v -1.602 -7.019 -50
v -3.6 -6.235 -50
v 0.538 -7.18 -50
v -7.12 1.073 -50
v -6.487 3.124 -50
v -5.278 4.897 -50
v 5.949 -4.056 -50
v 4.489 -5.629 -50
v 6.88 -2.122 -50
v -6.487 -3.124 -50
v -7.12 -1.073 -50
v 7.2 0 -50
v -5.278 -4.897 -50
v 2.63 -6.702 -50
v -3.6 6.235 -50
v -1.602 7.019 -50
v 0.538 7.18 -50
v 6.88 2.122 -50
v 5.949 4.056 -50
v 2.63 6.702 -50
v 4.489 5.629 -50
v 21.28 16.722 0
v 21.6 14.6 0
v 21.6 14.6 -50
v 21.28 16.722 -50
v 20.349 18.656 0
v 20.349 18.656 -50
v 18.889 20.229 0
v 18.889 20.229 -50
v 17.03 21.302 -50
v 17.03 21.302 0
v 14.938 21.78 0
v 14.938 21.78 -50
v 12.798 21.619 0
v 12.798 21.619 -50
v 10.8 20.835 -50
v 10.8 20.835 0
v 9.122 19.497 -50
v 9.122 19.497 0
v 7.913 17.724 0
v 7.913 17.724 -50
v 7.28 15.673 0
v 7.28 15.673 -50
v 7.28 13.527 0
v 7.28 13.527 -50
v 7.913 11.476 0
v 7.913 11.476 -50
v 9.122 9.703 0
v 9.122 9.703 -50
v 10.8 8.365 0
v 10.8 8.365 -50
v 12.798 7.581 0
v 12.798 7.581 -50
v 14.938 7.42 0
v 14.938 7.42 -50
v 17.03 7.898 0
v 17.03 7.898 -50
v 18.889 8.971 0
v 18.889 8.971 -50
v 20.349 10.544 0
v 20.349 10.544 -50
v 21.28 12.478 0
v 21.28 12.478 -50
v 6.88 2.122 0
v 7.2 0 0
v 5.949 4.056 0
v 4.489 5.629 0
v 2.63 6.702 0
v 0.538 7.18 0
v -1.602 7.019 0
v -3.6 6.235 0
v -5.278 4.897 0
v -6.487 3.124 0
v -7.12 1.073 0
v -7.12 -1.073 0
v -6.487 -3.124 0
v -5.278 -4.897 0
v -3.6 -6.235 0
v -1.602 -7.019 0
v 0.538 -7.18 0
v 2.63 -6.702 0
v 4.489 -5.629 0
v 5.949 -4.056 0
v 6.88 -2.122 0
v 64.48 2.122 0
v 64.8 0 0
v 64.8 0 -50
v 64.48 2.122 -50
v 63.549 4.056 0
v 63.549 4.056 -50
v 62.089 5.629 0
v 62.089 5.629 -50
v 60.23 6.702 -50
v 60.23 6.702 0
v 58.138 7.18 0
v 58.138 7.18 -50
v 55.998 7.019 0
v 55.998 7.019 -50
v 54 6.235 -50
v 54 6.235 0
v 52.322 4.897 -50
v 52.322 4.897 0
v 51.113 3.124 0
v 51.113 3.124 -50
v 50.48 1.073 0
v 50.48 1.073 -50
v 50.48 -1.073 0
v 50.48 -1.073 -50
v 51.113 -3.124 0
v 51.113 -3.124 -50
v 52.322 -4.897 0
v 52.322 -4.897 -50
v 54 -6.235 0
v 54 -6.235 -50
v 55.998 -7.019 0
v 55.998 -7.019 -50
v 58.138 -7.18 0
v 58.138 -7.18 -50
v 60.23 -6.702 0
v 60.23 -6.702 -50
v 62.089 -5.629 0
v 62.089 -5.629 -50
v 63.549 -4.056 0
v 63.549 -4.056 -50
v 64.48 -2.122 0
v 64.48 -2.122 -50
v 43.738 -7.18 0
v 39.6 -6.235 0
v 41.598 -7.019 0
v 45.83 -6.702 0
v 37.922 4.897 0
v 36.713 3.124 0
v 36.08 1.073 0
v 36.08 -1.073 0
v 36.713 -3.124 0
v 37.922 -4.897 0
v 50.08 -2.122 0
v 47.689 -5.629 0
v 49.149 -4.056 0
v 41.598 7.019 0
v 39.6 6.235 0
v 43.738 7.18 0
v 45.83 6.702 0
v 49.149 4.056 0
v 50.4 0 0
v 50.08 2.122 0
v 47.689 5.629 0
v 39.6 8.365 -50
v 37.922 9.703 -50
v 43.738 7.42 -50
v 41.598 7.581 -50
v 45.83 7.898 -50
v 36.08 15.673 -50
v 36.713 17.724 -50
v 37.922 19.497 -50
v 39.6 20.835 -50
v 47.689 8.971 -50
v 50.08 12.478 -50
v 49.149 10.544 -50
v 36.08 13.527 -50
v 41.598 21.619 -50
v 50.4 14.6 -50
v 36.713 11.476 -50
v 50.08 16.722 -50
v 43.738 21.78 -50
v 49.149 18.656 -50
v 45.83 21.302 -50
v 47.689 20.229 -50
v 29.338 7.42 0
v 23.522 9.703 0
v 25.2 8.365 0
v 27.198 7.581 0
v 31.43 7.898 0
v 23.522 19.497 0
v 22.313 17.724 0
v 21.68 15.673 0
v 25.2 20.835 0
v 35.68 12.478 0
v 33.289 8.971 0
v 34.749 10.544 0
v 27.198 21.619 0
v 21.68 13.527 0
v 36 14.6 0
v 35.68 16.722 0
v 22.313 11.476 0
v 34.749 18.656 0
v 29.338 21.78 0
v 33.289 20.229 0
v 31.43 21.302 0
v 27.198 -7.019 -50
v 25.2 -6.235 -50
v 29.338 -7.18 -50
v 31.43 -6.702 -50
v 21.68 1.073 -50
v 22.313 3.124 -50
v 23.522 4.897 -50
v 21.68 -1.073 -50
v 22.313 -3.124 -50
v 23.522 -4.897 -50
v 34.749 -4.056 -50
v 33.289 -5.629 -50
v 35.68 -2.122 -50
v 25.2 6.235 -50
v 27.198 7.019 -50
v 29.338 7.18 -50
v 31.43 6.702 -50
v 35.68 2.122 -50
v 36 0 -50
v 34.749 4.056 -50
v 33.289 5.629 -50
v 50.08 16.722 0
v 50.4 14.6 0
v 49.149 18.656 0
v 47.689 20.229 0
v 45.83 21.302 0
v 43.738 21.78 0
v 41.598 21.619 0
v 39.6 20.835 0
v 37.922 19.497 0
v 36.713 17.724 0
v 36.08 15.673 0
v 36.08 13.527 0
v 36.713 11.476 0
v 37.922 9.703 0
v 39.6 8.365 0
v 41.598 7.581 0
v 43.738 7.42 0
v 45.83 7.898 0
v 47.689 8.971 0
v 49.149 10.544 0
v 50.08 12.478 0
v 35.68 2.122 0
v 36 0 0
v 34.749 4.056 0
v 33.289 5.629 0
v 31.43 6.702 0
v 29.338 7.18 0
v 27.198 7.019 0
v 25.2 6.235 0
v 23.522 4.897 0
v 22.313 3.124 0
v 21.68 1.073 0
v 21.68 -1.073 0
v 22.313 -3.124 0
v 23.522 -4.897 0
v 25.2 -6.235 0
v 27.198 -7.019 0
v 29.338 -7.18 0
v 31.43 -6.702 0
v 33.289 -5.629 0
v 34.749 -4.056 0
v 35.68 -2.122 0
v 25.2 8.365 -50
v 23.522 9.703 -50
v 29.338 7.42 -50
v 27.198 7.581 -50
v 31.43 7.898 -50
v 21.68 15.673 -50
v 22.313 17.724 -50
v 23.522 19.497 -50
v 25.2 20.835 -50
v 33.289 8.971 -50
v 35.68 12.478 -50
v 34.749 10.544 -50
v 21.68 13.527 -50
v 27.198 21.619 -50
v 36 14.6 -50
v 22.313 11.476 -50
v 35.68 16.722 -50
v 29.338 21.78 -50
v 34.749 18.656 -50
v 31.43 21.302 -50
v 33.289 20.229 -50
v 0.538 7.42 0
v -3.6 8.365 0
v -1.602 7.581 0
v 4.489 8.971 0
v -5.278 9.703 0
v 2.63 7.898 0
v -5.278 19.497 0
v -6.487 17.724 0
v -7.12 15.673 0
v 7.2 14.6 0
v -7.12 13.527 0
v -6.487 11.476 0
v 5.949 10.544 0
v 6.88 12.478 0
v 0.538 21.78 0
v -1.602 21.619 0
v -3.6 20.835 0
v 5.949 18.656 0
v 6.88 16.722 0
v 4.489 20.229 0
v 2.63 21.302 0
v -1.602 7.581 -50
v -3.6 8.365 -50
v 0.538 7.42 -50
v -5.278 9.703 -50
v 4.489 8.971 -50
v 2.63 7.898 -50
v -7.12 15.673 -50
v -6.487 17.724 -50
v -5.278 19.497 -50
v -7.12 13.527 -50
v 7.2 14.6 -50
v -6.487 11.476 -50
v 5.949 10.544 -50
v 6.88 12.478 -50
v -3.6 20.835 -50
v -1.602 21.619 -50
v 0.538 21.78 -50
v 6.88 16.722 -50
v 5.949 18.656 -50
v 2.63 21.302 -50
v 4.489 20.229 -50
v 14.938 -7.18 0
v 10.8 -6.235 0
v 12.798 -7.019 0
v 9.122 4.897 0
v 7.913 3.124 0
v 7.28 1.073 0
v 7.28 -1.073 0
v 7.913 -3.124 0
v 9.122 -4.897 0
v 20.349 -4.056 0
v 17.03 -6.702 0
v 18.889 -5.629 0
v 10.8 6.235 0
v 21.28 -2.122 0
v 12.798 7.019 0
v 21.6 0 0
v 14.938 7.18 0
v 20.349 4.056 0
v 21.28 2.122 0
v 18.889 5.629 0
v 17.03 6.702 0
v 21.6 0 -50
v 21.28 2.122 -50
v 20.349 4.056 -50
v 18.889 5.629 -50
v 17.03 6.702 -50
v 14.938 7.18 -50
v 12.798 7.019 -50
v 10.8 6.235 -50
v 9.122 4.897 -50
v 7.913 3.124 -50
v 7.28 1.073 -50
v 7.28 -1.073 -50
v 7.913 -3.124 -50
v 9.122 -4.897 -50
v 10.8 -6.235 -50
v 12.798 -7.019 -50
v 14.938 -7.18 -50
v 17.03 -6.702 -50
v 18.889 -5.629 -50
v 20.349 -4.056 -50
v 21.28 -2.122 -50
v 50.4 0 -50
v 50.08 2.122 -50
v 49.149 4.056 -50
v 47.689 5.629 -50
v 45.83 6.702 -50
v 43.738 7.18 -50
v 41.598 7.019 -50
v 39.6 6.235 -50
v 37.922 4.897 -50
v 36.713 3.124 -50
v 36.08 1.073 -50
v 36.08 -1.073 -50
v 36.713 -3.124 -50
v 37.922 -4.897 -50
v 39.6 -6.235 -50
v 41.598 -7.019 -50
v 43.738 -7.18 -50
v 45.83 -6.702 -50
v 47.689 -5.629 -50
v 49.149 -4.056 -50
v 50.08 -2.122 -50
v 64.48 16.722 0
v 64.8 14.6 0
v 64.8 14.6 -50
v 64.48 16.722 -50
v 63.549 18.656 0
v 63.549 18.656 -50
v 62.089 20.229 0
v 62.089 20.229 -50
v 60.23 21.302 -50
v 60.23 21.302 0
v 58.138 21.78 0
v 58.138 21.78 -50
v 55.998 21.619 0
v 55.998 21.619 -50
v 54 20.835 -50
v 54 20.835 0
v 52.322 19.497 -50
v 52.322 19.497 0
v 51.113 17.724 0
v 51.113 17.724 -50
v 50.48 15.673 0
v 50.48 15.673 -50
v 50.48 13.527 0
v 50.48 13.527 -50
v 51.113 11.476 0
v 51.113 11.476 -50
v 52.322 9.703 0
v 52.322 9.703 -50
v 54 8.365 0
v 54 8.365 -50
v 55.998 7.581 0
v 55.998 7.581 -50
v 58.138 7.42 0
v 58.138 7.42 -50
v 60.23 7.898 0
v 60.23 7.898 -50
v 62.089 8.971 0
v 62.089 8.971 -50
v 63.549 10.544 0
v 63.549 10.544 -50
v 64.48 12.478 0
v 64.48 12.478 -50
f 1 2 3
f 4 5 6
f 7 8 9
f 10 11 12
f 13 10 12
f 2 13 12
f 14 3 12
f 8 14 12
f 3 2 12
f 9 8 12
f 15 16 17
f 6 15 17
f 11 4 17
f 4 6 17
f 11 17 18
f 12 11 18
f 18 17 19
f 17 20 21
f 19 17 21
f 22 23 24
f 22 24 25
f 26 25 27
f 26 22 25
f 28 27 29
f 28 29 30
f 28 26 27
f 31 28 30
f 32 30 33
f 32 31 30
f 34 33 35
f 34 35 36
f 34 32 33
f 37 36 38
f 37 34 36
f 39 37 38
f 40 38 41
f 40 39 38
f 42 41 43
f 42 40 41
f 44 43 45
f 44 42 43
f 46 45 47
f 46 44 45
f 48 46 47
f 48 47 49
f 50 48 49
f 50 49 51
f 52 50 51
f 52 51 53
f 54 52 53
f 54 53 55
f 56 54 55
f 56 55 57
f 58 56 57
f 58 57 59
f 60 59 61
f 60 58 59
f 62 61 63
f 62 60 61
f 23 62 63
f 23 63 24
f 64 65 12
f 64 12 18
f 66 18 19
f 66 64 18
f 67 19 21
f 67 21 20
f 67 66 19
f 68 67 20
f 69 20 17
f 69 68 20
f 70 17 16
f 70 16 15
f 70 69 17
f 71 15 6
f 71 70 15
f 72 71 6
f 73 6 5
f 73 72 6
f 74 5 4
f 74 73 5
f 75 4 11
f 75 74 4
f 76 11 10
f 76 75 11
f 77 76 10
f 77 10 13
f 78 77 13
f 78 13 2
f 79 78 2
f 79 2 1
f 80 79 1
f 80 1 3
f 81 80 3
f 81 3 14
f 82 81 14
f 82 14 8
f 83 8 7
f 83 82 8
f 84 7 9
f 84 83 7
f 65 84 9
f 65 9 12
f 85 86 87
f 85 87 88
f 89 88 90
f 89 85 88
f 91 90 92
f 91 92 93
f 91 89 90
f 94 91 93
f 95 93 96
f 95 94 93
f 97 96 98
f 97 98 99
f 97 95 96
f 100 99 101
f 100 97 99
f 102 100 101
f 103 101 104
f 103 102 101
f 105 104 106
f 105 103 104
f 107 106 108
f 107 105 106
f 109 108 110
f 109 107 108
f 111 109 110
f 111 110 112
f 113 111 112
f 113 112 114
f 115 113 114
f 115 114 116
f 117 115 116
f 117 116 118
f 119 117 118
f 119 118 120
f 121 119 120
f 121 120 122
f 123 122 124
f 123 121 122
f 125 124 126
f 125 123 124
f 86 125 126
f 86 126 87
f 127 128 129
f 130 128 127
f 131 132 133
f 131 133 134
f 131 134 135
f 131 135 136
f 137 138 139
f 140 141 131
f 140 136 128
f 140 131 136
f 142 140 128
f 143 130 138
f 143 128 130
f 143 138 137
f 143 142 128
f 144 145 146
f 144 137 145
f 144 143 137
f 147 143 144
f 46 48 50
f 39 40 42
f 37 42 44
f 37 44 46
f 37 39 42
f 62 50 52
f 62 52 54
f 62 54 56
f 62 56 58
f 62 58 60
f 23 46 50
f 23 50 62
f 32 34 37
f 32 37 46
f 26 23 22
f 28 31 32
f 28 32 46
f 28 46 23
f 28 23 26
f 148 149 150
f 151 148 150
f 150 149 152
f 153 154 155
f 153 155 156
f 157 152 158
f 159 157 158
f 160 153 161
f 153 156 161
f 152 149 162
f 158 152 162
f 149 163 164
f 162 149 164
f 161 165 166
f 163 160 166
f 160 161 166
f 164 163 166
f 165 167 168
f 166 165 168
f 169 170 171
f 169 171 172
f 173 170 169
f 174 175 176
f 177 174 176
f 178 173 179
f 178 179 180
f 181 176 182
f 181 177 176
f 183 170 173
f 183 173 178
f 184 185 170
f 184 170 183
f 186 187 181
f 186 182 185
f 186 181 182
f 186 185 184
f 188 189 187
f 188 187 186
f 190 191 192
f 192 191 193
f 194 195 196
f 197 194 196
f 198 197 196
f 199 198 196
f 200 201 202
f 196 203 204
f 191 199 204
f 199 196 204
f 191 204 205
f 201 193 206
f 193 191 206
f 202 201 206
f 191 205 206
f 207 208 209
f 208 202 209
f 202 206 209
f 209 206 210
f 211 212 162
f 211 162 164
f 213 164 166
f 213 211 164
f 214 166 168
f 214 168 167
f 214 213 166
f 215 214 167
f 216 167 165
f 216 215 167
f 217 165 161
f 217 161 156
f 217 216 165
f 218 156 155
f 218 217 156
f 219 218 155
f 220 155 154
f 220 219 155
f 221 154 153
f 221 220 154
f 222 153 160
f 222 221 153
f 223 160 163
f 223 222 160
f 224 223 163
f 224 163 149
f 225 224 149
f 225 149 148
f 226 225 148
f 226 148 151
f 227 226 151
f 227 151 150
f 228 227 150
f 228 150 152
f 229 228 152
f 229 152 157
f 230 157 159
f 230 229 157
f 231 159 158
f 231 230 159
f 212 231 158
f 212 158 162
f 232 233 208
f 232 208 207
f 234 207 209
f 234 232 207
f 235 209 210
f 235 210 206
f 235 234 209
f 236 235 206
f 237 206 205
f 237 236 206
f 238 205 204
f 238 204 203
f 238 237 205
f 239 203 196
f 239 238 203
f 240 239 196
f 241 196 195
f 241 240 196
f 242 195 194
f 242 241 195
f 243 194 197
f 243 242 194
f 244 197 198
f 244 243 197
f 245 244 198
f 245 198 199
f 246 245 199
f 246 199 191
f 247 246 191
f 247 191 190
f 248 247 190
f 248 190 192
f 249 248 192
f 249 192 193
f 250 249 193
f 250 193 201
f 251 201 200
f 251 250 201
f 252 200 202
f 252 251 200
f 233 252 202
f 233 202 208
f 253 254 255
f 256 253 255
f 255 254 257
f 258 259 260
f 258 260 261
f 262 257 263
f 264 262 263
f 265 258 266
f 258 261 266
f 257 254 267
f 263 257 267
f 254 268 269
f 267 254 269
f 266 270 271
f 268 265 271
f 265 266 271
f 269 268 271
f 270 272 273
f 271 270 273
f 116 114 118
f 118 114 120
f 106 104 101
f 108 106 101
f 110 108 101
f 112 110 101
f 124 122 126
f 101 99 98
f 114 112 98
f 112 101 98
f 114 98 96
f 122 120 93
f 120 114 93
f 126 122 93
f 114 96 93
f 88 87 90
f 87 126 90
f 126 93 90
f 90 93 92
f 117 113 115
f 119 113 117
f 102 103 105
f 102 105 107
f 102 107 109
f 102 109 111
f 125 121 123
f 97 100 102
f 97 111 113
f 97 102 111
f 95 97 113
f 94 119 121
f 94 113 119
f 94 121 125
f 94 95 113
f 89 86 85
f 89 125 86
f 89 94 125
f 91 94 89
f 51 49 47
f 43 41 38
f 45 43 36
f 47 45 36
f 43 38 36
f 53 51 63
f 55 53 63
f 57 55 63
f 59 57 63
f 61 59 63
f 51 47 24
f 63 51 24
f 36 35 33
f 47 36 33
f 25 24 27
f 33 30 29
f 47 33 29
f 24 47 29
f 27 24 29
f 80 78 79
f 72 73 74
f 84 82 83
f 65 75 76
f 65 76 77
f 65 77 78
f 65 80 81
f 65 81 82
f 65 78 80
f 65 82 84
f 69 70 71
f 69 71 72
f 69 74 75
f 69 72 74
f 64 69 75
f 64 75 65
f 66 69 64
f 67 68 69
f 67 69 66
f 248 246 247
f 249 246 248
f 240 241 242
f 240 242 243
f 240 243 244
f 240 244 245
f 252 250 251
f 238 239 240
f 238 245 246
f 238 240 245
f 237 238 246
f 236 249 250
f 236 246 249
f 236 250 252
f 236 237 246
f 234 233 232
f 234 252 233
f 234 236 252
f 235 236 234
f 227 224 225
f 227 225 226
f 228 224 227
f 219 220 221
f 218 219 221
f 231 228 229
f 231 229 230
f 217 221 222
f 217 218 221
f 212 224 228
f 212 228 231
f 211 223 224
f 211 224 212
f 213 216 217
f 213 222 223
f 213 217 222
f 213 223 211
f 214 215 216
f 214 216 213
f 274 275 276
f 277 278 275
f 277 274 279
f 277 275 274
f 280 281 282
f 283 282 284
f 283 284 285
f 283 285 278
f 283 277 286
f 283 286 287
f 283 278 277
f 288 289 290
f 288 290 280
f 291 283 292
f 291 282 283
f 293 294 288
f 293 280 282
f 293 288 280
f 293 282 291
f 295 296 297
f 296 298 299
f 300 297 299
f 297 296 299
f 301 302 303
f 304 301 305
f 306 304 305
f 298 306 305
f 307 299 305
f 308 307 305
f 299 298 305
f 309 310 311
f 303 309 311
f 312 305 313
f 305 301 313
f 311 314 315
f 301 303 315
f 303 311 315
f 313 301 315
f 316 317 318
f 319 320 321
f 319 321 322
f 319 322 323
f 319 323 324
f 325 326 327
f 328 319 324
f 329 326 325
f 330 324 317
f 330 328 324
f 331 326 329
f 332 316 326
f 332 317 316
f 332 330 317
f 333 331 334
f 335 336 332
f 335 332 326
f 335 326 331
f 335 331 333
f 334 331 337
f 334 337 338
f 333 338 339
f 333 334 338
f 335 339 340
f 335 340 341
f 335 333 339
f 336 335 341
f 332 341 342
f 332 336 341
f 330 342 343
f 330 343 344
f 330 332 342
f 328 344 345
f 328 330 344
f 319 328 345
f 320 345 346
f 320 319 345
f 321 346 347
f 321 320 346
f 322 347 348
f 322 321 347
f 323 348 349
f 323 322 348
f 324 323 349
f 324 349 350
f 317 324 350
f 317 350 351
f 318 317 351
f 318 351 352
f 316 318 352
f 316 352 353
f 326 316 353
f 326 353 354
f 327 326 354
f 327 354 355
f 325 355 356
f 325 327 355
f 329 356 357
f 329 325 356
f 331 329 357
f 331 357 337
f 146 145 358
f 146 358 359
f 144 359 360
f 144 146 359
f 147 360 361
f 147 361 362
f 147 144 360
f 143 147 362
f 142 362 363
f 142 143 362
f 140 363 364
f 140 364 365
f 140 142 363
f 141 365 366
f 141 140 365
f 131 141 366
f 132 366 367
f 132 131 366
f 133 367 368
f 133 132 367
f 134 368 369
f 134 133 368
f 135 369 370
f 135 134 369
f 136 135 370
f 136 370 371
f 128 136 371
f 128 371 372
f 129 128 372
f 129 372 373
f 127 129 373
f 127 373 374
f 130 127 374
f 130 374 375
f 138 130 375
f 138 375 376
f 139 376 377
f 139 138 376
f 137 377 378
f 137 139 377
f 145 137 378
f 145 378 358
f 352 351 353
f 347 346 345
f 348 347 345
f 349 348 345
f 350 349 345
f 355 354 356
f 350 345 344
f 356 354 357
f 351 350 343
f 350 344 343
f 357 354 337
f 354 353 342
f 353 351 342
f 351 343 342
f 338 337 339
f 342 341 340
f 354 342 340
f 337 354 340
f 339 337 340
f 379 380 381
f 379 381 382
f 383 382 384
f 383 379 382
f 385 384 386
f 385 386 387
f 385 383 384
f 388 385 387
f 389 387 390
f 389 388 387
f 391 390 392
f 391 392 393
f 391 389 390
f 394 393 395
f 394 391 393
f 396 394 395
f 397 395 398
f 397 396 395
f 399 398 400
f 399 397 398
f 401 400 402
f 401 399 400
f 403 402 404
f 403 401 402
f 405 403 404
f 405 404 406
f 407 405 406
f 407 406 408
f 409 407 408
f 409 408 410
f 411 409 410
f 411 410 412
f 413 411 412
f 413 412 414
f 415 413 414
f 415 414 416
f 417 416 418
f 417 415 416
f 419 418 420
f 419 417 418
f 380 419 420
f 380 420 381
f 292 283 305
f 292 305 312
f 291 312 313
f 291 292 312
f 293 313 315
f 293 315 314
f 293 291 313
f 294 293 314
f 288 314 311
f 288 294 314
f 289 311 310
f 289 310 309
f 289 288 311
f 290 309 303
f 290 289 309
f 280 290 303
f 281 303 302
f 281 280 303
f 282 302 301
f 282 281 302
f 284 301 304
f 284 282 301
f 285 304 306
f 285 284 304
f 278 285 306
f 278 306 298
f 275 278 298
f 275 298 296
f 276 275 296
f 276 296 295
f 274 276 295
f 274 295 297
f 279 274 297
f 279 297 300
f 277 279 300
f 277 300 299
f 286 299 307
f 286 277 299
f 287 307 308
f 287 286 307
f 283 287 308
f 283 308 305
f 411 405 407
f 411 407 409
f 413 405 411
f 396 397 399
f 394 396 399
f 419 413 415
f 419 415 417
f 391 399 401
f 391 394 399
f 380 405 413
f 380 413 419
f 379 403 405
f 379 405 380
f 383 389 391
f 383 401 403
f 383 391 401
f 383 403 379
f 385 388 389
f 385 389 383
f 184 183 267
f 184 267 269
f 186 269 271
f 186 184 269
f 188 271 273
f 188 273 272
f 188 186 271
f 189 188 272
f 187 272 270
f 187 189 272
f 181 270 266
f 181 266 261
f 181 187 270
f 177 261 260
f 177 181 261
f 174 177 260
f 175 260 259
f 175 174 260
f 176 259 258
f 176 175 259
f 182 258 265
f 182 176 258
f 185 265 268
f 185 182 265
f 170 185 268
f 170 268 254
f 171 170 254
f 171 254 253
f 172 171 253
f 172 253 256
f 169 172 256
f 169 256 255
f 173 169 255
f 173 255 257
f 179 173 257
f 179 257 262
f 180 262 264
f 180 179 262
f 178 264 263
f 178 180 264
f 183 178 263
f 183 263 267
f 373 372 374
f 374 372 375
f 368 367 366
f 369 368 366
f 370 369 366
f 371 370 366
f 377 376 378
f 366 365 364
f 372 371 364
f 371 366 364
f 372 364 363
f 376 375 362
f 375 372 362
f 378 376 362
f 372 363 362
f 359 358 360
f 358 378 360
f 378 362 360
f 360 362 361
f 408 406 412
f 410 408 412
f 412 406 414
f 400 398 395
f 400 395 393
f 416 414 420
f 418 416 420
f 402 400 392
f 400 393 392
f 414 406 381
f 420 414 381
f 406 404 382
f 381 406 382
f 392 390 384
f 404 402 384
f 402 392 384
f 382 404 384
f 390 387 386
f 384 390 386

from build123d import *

# Parameters (mm, degrees)
SKETCH1_R              = 7.2
BOSS_EXTRUDE1_DEPTH    = 50
BOSS_EXTRUDE1_2_DEPTH  = 50
BOSS_EXTRUDE1_3_DEPTH  = 50
BOSS_EXTRUDE1_4_DEPTH  = 50
BOSS_EXTRUDE1_5_DEPTH  = 50
BOSS_EXTRUDE1_6_DEPTH  = 50
BOSS_EXTRUDE1_7_DEPTH  = 50
BOSS_EXTRUDE1_8_DEPTH  = 50
BOSS_EXTRUDE1_9_DEPTH  = 50
BOSS_EXTRUDE1_10_DEPTH = 50


with BuildPart() as part:
    # Sketch1 → Boss-Extrude1 (new body)
    with BuildSketch(Plane.XY):
        Circle(SKETCH1_R)
    extrude(amount=-BOSS_EXTRUDE1_DEPTH)


with BuildPart() as body_2:
    # Sketch1 → Boss-Extrude1 2 (new body)
    with BuildSketch(Plane.XY):
        with Locations((28.8, 0)):
            Circle(SKETCH1_R)
    extrude(amount=-BOSS_EXTRUDE1_2_DEPTH)


with BuildPart() as body_3:
    # Sketch1 → Boss-Extrude1 3 (new body)
    with BuildSketch(Plane.XY):
        with Locations((14.4, 0)):
            Circle(SKETCH1_R)
    extrude(amount=-BOSS_EXTRUDE1_3_DEPTH)


with BuildPart() as body_4:
    # Sketch1 → Boss-Extrude1 4 (new body)
    with BuildSketch(Plane.XY):
        with Locations((43.2, 0)):
            Circle(SKETCH1_R)
    extrude(amount=-BOSS_EXTRUDE1_4_DEPTH)


with BuildPart() as body_5:
    # Sketch1 → Boss-Extrude1 5 (new body)
    with BuildSketch(Plane.XY):
        with Locations((57.6, 0)):
            Circle(SKETCH1_R)
    extrude(amount=-BOSS_EXTRUDE1_5_DEPTH)


with BuildPart() as body_6:
    # Sketch1 → Boss-Extrude1 6 (new body)
    with BuildSketch(Plane.XY):
        with Locations((0, 14.6)):
            Circle(SKETCH1_R)
    extrude(amount=-BOSS_EXTRUDE1_6_DEPTH)


with BuildPart() as body_7:
    # Sketch1 → Boss-Extrude1 7 (new body)
    with BuildSketch(Plane.XY):
        with Locations((14.4, 14.6)):
            Circle(SKETCH1_R)
    extrude(amount=-BOSS_EXTRUDE1_7_DEPTH)


with BuildPart() as body_8:
    # Sketch1 → Boss-Extrude1 8 (new body)
    with BuildSketch(Plane.XY):
        with Locations((28.8, 14.6)):
            Circle(SKETCH1_R)
    extrude(amount=-BOSS_EXTRUDE1_8_DEPTH)


with BuildPart() as body_9:
    # Sketch1 → Boss-Extrude1 9 (new body)
    with BuildSketch(Plane.XY):
        with Locations((43.2, 14.6)):
            Circle(SKETCH1_R)
    extrude(amount=-BOSS_EXTRUDE1_9_DEPTH)


with BuildPart() as body_10:
    # Sketch1 → Boss-Extrude1 10 (new body)
    with BuildSketch(Plane.XY):
        with Locations((57.6, 14.6)):
            Circle(SKETCH1_R)
    extrude(amount=-BOSS_EXTRUDE1_10_DEPTH)


solid = Compound([part.part, body_2.part, body_3.part, body_4.part, body_5.part, body_6.part, body_7.part, body_8.part, body_9.part, body_10.part])
